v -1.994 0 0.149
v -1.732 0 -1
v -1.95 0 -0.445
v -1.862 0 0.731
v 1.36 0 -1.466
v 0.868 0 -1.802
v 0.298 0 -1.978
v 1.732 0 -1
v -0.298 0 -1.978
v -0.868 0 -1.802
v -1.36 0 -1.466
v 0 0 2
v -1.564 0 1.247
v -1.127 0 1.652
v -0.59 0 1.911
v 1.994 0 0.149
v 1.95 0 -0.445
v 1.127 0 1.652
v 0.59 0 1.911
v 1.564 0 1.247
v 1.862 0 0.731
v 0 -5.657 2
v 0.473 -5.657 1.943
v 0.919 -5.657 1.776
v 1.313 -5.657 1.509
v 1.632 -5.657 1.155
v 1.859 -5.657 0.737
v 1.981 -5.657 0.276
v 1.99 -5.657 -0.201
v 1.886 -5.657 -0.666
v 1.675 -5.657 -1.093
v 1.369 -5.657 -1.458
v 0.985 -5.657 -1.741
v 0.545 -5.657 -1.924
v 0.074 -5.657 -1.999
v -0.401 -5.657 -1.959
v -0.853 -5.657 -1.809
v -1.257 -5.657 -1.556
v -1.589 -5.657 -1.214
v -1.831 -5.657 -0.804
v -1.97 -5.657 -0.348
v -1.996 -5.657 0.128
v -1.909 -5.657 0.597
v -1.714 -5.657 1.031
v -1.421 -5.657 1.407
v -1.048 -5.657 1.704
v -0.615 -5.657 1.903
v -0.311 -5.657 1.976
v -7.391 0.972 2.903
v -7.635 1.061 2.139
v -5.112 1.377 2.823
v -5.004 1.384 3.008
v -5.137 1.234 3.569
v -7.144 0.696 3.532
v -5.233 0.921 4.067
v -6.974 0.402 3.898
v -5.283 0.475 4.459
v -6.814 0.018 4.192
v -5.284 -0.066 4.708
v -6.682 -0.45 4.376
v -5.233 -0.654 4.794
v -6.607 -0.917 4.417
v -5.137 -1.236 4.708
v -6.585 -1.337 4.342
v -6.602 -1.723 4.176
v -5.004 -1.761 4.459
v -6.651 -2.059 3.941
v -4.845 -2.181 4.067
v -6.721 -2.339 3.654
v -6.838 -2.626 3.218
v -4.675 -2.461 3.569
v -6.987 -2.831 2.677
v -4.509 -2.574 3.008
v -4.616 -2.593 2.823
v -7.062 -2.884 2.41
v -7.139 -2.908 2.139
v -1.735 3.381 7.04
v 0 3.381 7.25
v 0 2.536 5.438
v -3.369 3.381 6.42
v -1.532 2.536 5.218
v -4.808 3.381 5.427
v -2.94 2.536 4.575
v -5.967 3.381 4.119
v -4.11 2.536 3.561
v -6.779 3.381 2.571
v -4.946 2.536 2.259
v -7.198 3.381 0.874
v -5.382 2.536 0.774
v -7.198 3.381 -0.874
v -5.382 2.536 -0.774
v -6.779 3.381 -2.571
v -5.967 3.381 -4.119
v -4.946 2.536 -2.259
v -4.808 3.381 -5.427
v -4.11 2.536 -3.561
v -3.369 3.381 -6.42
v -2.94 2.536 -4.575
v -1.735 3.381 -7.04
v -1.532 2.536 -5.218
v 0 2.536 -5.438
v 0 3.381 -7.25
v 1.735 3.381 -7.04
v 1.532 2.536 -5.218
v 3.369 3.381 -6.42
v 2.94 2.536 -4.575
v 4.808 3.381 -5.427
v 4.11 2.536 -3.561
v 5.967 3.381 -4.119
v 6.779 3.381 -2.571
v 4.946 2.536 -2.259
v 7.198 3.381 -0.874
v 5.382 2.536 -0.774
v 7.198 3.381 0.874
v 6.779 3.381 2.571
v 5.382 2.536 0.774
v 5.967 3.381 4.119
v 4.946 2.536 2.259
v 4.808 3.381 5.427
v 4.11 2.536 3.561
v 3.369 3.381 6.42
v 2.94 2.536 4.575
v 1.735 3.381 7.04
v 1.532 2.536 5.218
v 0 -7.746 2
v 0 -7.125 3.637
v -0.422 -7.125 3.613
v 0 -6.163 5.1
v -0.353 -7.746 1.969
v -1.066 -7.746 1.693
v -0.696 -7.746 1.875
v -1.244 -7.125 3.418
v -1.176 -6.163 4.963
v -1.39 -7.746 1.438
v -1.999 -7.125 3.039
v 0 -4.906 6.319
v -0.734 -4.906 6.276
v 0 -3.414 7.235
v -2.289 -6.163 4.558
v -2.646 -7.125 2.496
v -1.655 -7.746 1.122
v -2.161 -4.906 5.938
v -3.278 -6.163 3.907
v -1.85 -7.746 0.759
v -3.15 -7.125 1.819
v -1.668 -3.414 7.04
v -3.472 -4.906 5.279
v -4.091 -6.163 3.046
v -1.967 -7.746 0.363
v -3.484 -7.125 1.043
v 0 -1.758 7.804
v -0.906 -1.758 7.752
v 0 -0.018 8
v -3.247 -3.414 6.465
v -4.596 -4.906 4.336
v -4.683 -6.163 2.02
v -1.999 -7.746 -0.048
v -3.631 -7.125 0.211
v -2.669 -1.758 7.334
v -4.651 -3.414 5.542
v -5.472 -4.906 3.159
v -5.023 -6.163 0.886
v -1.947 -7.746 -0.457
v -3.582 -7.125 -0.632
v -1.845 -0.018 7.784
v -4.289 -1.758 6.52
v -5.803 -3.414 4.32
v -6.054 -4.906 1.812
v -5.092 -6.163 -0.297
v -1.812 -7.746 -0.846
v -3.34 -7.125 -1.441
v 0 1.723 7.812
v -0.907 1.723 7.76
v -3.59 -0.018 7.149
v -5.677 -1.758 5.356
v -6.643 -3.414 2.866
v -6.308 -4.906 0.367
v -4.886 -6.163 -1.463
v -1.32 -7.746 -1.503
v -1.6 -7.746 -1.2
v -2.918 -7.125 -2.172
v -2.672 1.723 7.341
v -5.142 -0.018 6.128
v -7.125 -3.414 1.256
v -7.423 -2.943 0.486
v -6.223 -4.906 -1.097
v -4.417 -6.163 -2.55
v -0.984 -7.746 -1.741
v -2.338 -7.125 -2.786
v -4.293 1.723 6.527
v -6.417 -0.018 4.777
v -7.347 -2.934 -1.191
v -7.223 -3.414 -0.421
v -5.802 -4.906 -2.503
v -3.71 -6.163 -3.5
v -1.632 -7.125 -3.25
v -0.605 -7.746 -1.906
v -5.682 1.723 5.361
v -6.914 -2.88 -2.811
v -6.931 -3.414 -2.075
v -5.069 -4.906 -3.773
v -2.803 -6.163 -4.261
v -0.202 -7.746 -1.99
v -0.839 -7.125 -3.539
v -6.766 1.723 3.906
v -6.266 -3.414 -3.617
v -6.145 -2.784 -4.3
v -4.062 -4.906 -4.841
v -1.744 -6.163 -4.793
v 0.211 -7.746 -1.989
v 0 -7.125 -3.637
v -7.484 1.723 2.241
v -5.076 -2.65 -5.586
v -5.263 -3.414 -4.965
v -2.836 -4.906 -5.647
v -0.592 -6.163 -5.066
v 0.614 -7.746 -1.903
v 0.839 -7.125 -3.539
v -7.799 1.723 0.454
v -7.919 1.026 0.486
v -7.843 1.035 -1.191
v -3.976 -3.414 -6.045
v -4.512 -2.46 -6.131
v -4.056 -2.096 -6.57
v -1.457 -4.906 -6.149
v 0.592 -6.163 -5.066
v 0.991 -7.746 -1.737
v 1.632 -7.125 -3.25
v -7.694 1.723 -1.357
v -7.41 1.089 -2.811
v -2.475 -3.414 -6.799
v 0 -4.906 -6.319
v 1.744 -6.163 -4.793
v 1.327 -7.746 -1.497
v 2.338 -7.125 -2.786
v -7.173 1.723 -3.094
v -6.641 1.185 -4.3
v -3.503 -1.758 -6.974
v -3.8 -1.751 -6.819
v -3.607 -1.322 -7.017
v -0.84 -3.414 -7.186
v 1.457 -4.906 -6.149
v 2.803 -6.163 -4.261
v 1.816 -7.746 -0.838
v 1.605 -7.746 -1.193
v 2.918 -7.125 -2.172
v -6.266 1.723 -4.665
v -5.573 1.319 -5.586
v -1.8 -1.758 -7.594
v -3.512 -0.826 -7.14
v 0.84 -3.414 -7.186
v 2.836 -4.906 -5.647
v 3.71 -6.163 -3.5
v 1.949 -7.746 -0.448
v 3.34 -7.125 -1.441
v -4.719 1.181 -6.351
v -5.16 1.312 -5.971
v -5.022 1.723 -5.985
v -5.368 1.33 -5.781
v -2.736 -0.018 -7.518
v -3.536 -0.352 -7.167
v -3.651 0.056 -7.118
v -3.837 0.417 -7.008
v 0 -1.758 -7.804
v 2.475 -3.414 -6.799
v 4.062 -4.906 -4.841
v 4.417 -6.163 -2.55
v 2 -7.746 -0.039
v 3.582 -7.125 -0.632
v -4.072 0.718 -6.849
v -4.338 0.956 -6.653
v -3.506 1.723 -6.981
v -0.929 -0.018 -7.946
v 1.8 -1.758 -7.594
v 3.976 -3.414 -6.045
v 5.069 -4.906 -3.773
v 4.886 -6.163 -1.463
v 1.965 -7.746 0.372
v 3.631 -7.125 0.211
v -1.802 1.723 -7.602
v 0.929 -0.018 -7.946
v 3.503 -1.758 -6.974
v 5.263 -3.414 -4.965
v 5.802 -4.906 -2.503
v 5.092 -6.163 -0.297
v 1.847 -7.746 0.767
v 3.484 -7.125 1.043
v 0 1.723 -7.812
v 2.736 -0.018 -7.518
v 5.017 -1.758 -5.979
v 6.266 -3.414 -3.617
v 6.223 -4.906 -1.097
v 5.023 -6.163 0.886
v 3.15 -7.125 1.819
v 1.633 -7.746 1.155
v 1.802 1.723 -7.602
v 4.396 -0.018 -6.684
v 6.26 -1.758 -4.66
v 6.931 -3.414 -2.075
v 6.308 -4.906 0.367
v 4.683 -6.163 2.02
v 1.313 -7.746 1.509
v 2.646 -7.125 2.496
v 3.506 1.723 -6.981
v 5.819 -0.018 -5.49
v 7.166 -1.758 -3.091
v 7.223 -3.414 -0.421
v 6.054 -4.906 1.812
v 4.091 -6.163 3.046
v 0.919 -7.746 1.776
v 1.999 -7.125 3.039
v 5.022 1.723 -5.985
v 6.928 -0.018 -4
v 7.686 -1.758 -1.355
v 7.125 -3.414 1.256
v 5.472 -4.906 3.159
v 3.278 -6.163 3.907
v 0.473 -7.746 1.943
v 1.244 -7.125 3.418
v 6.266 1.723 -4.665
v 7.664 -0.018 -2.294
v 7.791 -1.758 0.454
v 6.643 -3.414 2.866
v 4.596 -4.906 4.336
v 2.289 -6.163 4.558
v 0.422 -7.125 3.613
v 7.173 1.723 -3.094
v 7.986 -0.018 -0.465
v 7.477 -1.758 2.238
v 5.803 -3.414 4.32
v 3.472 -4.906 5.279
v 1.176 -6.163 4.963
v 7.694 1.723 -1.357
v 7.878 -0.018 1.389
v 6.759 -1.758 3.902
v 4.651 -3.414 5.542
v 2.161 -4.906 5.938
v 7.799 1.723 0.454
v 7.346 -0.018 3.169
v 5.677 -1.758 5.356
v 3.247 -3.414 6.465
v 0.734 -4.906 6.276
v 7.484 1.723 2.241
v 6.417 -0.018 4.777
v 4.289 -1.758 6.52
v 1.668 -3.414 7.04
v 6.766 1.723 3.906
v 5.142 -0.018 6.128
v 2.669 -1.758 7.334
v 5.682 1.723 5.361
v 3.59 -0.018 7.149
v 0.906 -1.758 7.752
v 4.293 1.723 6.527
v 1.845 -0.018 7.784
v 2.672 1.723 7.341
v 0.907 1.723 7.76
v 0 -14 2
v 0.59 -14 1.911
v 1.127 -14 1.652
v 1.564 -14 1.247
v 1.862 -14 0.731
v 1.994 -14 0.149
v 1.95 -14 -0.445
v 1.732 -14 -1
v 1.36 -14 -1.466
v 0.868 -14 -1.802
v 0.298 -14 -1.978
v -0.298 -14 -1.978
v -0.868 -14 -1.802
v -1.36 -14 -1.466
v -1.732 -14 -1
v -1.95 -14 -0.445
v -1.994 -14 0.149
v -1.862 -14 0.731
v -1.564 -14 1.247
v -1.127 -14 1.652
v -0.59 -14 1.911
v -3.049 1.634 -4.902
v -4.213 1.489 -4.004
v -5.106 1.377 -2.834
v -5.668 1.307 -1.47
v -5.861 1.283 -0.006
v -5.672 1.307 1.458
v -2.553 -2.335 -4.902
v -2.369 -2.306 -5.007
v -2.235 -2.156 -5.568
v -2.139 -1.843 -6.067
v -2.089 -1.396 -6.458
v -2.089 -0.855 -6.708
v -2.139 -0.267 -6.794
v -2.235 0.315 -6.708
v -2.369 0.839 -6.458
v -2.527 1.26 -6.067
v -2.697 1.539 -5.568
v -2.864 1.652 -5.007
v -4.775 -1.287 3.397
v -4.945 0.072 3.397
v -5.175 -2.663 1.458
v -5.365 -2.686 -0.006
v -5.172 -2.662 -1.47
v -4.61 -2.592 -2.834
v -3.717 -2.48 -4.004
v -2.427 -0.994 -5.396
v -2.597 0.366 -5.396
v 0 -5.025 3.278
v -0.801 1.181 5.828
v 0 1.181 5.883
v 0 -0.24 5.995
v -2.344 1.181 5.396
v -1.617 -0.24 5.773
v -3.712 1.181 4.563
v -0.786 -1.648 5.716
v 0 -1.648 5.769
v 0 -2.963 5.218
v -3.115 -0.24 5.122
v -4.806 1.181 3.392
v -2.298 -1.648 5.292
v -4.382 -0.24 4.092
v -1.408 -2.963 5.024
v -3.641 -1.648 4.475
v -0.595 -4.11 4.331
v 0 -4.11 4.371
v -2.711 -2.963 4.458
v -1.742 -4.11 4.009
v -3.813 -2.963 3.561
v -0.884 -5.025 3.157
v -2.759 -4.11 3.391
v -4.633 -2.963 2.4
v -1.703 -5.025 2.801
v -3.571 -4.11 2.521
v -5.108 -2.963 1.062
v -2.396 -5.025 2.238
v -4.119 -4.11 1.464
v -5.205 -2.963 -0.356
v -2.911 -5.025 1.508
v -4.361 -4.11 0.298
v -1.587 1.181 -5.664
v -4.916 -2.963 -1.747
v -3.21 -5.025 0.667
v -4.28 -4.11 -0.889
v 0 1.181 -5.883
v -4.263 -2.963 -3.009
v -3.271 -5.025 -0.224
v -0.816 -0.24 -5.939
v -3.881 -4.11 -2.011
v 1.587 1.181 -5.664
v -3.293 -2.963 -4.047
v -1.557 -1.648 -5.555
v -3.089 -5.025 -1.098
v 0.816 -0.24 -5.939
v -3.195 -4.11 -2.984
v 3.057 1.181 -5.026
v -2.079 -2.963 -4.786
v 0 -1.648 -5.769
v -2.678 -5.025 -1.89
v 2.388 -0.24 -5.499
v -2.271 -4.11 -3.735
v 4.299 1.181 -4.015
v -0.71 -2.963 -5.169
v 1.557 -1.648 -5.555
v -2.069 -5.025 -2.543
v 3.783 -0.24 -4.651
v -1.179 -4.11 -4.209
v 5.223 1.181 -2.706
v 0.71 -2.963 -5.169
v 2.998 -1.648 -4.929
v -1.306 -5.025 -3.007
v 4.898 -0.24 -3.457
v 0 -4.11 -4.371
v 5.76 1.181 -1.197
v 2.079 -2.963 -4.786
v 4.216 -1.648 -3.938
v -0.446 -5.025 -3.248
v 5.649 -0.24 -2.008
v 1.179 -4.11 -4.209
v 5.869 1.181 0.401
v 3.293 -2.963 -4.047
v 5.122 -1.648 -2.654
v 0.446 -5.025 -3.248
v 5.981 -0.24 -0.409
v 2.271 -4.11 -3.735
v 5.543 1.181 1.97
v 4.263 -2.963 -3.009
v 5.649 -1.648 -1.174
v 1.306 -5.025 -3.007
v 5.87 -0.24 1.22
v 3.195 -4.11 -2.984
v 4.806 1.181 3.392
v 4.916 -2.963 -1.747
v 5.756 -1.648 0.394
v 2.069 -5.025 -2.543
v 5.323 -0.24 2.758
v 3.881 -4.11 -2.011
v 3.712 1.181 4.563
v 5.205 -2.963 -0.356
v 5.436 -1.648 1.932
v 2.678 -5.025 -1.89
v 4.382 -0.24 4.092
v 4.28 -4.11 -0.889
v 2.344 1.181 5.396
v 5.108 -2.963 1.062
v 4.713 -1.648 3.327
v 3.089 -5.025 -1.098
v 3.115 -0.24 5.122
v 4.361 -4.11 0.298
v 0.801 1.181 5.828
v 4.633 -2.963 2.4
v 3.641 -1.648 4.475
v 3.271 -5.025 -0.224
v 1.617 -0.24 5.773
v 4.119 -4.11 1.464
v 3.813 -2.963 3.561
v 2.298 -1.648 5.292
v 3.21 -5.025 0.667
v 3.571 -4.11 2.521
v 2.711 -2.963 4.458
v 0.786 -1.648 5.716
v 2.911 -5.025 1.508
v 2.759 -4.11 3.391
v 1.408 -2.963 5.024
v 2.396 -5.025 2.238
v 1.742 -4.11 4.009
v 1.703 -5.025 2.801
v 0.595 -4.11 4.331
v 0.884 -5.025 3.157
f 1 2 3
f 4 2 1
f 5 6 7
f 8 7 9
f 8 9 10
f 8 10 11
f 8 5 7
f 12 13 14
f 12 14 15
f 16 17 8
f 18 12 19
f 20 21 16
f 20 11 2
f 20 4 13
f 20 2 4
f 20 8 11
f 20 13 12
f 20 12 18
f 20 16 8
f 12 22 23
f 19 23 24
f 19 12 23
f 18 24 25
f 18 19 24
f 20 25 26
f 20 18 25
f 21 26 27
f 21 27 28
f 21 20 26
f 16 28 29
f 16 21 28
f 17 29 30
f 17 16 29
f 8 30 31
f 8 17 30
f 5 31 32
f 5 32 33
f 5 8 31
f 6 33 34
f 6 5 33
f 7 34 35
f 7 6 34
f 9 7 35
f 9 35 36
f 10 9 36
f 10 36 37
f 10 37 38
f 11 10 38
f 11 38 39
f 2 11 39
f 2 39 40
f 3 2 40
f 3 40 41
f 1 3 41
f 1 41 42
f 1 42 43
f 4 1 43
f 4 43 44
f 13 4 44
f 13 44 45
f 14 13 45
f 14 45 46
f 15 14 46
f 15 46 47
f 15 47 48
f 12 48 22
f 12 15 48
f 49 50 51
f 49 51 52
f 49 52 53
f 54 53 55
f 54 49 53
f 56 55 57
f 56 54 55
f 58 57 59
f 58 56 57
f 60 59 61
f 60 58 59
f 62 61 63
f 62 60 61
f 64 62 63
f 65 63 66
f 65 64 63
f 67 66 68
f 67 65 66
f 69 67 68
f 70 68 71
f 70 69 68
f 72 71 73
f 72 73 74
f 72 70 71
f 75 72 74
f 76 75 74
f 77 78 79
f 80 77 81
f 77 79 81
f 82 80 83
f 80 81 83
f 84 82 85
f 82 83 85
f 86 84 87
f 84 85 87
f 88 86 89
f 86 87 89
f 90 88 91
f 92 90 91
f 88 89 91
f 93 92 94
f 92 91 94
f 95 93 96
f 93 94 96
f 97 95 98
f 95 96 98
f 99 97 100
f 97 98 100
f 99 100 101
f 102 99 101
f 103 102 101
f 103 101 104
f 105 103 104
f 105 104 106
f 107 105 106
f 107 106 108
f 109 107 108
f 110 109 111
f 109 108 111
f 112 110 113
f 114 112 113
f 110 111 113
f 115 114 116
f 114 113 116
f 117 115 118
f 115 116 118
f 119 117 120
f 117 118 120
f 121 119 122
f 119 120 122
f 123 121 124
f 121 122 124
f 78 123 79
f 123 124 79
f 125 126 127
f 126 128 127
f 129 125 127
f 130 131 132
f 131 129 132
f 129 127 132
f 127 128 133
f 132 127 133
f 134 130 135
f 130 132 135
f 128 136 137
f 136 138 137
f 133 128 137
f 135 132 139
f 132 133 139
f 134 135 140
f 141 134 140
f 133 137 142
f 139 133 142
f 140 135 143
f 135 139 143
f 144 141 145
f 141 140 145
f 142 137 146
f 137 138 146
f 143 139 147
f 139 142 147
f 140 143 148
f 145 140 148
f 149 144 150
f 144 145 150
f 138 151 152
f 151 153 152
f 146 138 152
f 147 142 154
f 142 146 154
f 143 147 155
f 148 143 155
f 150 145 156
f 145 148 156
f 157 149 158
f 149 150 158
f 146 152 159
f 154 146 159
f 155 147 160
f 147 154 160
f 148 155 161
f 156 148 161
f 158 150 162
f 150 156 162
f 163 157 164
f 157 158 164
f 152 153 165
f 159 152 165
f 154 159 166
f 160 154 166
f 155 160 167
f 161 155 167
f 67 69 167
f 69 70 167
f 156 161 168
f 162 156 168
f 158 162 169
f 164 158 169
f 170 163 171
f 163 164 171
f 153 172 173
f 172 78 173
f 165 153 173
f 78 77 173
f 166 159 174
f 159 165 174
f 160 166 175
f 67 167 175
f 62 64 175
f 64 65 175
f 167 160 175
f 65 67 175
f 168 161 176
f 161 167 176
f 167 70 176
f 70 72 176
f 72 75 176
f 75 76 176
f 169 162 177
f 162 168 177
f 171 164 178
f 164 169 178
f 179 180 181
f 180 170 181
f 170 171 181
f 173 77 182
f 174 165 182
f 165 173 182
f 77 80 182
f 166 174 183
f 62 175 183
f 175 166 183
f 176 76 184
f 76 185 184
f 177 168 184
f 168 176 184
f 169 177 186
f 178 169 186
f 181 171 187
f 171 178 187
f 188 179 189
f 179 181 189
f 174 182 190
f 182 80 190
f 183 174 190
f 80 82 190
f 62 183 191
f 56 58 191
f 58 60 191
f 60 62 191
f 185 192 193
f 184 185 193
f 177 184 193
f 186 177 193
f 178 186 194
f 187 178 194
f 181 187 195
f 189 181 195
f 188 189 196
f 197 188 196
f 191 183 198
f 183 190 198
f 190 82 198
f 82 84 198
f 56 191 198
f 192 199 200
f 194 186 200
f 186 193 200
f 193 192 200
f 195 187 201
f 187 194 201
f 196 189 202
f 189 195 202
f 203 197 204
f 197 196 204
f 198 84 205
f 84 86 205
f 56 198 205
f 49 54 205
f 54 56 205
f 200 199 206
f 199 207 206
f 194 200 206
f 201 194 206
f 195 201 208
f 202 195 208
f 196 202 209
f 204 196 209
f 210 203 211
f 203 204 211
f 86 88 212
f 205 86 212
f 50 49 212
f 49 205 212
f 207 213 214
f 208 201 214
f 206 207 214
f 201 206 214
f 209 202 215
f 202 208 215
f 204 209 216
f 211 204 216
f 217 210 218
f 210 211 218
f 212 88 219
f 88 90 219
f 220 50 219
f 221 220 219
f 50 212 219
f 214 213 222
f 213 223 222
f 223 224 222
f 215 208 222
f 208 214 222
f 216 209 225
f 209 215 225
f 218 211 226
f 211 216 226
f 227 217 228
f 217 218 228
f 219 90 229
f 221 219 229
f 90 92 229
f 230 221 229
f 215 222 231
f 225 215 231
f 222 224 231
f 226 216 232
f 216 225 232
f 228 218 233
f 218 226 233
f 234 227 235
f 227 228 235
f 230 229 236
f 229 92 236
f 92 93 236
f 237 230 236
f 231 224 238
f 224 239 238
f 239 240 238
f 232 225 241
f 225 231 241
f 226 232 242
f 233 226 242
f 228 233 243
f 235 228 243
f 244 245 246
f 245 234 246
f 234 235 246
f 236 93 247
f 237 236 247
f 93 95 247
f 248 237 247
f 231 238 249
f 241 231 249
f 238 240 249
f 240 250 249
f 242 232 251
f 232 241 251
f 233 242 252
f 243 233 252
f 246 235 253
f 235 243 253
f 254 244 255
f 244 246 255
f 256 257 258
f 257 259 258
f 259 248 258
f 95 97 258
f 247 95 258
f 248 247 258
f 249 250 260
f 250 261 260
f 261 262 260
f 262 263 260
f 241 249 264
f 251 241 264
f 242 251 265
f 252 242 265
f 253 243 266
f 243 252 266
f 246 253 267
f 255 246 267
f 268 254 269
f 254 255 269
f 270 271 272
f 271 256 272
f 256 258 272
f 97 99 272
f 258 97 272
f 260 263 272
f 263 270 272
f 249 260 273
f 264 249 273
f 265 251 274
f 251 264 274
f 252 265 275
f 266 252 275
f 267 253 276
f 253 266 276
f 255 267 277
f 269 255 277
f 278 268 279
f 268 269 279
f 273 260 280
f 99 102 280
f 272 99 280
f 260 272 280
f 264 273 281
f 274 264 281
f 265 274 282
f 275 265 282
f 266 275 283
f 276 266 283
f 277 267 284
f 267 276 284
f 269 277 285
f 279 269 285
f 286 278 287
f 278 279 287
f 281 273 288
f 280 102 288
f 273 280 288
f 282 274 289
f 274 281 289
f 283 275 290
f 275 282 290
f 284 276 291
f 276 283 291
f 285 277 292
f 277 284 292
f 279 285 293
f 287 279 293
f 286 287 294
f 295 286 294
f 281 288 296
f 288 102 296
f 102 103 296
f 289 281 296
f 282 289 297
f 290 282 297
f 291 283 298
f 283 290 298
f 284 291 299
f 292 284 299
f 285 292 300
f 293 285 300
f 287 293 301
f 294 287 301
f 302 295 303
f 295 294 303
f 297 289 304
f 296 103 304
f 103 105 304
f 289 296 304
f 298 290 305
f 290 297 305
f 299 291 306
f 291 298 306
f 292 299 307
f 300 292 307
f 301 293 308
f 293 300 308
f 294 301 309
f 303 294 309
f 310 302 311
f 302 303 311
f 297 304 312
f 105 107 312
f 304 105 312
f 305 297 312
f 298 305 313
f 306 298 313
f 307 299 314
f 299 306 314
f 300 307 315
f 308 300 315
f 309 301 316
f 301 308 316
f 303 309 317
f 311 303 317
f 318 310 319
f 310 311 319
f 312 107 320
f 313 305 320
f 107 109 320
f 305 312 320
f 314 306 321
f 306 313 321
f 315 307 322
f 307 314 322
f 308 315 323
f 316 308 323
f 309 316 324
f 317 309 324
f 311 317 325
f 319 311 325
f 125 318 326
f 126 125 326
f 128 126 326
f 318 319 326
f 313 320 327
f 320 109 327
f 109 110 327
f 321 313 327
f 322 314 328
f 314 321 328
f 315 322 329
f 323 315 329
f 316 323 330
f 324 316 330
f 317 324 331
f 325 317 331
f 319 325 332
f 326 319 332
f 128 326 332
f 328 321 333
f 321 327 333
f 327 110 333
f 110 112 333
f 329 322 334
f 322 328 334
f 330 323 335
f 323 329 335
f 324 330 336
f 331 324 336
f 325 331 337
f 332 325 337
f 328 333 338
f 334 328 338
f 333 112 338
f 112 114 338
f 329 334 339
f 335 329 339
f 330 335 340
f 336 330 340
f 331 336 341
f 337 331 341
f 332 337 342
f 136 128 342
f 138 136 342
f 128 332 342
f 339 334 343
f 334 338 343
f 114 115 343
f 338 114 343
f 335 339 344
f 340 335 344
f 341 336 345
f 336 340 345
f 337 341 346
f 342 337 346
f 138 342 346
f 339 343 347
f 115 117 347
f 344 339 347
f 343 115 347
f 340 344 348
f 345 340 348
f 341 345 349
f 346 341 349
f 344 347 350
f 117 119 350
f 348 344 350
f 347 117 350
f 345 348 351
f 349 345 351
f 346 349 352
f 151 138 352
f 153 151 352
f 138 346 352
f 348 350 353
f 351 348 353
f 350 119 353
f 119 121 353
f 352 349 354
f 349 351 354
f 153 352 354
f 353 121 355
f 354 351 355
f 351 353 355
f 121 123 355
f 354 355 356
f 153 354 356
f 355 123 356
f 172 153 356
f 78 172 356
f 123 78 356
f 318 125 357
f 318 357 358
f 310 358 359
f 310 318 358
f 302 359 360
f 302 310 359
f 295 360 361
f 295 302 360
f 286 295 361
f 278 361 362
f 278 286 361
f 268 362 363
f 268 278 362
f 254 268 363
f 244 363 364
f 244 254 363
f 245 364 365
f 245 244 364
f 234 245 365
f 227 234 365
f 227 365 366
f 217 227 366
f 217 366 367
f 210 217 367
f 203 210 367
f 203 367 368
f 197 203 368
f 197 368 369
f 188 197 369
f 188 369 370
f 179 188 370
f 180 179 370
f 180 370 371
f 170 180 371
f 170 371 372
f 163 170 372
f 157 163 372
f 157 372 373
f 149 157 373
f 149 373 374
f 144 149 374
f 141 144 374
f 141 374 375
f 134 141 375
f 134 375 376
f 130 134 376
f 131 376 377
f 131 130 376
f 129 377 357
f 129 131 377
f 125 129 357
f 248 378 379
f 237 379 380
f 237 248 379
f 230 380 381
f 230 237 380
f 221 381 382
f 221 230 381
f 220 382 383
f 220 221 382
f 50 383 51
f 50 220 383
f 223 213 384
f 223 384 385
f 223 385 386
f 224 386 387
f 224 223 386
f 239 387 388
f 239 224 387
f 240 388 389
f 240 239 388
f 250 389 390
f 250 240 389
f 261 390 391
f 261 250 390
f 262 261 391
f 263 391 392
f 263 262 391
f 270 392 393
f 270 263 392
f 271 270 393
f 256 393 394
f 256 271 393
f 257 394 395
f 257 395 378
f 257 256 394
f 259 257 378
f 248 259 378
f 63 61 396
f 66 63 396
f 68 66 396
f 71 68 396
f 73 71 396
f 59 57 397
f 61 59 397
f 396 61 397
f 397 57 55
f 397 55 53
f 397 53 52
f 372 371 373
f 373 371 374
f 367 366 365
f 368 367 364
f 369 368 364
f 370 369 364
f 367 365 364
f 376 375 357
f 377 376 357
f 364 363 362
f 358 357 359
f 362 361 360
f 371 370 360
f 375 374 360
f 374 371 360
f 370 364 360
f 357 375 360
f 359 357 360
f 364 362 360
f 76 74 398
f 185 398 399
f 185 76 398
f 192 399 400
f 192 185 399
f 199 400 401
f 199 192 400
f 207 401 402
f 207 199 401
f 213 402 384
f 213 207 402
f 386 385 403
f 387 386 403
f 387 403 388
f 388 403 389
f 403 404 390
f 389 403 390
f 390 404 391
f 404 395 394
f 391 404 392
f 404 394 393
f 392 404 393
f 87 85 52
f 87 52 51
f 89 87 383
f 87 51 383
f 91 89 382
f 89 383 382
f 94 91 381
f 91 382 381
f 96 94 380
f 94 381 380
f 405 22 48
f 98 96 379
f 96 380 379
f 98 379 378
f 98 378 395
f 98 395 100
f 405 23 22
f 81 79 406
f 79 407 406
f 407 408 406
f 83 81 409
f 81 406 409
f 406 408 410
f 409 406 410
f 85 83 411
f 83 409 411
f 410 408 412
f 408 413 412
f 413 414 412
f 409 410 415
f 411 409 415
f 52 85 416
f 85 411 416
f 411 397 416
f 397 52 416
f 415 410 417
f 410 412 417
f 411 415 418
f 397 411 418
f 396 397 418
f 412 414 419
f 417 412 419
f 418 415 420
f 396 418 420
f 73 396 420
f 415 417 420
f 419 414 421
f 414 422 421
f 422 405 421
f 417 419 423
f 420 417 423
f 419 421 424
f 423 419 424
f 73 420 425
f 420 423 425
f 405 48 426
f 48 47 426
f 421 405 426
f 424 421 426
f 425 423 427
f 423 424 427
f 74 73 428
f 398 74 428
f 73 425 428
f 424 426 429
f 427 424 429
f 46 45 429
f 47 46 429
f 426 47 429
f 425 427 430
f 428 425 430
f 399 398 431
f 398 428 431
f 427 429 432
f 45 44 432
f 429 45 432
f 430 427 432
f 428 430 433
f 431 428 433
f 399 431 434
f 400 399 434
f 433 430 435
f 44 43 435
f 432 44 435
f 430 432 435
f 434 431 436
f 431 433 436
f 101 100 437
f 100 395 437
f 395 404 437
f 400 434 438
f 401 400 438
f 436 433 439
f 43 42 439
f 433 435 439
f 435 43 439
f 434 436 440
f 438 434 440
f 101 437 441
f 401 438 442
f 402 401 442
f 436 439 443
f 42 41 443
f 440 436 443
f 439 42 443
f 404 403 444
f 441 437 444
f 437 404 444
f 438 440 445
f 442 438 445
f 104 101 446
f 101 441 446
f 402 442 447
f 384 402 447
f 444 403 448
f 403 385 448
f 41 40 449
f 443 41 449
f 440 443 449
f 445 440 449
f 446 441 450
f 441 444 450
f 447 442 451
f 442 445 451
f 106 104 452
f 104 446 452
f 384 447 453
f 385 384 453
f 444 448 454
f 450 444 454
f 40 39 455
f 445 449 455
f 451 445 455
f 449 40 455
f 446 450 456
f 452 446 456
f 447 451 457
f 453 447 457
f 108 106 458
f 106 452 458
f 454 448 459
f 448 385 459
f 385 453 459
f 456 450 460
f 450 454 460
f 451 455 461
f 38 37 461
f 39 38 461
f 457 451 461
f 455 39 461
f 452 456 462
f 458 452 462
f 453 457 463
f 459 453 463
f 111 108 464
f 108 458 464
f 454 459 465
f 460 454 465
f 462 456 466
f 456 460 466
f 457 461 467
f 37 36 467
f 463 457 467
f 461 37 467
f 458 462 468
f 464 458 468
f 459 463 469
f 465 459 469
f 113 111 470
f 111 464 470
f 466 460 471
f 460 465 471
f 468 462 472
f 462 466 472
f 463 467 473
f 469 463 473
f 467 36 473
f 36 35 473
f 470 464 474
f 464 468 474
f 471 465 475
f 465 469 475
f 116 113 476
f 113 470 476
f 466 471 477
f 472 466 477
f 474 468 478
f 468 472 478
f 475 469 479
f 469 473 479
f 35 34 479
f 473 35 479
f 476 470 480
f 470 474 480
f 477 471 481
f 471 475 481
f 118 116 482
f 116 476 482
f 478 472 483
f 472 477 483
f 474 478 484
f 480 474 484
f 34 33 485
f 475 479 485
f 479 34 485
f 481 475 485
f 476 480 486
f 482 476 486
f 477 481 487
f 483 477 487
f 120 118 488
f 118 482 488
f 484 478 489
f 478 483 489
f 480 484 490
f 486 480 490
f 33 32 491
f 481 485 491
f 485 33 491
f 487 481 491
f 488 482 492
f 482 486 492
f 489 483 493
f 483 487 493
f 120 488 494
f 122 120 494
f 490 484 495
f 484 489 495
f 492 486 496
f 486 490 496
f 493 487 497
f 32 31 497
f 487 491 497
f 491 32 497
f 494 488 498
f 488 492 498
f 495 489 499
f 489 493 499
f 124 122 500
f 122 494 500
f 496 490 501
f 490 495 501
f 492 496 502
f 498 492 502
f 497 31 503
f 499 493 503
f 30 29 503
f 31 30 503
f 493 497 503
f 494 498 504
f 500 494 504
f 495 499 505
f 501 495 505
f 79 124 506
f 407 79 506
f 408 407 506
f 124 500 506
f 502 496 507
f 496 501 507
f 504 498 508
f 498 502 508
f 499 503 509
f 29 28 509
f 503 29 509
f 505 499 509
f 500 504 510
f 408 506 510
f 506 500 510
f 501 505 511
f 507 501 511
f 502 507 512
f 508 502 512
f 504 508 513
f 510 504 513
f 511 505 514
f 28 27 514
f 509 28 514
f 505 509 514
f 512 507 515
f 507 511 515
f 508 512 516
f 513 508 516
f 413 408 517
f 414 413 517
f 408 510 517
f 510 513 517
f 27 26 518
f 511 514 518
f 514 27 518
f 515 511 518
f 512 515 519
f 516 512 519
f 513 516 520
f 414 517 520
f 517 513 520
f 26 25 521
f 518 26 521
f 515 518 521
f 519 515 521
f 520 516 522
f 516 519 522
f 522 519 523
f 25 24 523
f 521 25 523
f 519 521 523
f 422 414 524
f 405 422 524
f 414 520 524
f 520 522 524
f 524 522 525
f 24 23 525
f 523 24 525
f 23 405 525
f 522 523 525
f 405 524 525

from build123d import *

# Parameters (mm, degrees)
ESQUISSE2_R             = 2
BOSS_EXTRU_1_DEPTH      = 14
ENL_V_MAT_EXTRU_1_DEPTH = 7


with BuildPart() as part:
    # Esquisse1 → Révolution1 (revolve)
    with BuildSketch(Plane.XY, mode=Mode.PRIVATE) as r_volution1_sk:
        with BuildLine():
            Line((-7.250462296, 3.380946094), (-5.437846722, 2.53570957))
            ThreePointArc((-5.437846722, 2.53570957), (-5.060348675, -3.22379765), (0, -6))
            Line((0, -6), (0, -8))
            ThreePointArc((0, -8), (-6.747131567, -4.298396867), (-7.250462296, 3.380946094))
        make_face()
    revolve(r_volution1_sk.sketch.rotate(Axis((0, 0, 0), (0, -1, 0)), 270), axis=Axis((0, 0, 0), (0, -1, 0)))

    # Esquisse2 → Boss.-Extru.1 (add)
    with BuildSketch(Plane(origin=(0, 0, 0), x_dir=(1, 0, 0), z_dir=(0, 1, 0))):
        with Locations(Location((0, 0, 0), (0, 0, 270))):
            Circle(ESQUISSE2_R)
    extrude(amount=-BOSS_EXTRU_1_DEPTH)

    # Esquisse3 → Enlèv. mat.-Extru.1 (cut)
    with BuildSketch(Plane(origin=(-10.393608687, -1.299249719, -2.818585808), x_dir=(-0.25784022856565836, -0.03223123504955077, 0.9656498143842775), z_dir=(-0.9581923956348063, -0.11977853300162247, -0.2598469472201095))):
        with BuildLine():
            Line((-4, 2), (4, 2))
            ThreePointArc((4, 2), (6, 0), (4, -2))
            Line((4, -2), (-4, -2))
            ThreePointArc((-4, -2), (-6, 0), (-4, 2))
        make_face()
    extrude(amount=-ENL_V_MAT_EXTRU_1_DEPTH, mode=Mode.SUBTRACT)


solid = part.part
